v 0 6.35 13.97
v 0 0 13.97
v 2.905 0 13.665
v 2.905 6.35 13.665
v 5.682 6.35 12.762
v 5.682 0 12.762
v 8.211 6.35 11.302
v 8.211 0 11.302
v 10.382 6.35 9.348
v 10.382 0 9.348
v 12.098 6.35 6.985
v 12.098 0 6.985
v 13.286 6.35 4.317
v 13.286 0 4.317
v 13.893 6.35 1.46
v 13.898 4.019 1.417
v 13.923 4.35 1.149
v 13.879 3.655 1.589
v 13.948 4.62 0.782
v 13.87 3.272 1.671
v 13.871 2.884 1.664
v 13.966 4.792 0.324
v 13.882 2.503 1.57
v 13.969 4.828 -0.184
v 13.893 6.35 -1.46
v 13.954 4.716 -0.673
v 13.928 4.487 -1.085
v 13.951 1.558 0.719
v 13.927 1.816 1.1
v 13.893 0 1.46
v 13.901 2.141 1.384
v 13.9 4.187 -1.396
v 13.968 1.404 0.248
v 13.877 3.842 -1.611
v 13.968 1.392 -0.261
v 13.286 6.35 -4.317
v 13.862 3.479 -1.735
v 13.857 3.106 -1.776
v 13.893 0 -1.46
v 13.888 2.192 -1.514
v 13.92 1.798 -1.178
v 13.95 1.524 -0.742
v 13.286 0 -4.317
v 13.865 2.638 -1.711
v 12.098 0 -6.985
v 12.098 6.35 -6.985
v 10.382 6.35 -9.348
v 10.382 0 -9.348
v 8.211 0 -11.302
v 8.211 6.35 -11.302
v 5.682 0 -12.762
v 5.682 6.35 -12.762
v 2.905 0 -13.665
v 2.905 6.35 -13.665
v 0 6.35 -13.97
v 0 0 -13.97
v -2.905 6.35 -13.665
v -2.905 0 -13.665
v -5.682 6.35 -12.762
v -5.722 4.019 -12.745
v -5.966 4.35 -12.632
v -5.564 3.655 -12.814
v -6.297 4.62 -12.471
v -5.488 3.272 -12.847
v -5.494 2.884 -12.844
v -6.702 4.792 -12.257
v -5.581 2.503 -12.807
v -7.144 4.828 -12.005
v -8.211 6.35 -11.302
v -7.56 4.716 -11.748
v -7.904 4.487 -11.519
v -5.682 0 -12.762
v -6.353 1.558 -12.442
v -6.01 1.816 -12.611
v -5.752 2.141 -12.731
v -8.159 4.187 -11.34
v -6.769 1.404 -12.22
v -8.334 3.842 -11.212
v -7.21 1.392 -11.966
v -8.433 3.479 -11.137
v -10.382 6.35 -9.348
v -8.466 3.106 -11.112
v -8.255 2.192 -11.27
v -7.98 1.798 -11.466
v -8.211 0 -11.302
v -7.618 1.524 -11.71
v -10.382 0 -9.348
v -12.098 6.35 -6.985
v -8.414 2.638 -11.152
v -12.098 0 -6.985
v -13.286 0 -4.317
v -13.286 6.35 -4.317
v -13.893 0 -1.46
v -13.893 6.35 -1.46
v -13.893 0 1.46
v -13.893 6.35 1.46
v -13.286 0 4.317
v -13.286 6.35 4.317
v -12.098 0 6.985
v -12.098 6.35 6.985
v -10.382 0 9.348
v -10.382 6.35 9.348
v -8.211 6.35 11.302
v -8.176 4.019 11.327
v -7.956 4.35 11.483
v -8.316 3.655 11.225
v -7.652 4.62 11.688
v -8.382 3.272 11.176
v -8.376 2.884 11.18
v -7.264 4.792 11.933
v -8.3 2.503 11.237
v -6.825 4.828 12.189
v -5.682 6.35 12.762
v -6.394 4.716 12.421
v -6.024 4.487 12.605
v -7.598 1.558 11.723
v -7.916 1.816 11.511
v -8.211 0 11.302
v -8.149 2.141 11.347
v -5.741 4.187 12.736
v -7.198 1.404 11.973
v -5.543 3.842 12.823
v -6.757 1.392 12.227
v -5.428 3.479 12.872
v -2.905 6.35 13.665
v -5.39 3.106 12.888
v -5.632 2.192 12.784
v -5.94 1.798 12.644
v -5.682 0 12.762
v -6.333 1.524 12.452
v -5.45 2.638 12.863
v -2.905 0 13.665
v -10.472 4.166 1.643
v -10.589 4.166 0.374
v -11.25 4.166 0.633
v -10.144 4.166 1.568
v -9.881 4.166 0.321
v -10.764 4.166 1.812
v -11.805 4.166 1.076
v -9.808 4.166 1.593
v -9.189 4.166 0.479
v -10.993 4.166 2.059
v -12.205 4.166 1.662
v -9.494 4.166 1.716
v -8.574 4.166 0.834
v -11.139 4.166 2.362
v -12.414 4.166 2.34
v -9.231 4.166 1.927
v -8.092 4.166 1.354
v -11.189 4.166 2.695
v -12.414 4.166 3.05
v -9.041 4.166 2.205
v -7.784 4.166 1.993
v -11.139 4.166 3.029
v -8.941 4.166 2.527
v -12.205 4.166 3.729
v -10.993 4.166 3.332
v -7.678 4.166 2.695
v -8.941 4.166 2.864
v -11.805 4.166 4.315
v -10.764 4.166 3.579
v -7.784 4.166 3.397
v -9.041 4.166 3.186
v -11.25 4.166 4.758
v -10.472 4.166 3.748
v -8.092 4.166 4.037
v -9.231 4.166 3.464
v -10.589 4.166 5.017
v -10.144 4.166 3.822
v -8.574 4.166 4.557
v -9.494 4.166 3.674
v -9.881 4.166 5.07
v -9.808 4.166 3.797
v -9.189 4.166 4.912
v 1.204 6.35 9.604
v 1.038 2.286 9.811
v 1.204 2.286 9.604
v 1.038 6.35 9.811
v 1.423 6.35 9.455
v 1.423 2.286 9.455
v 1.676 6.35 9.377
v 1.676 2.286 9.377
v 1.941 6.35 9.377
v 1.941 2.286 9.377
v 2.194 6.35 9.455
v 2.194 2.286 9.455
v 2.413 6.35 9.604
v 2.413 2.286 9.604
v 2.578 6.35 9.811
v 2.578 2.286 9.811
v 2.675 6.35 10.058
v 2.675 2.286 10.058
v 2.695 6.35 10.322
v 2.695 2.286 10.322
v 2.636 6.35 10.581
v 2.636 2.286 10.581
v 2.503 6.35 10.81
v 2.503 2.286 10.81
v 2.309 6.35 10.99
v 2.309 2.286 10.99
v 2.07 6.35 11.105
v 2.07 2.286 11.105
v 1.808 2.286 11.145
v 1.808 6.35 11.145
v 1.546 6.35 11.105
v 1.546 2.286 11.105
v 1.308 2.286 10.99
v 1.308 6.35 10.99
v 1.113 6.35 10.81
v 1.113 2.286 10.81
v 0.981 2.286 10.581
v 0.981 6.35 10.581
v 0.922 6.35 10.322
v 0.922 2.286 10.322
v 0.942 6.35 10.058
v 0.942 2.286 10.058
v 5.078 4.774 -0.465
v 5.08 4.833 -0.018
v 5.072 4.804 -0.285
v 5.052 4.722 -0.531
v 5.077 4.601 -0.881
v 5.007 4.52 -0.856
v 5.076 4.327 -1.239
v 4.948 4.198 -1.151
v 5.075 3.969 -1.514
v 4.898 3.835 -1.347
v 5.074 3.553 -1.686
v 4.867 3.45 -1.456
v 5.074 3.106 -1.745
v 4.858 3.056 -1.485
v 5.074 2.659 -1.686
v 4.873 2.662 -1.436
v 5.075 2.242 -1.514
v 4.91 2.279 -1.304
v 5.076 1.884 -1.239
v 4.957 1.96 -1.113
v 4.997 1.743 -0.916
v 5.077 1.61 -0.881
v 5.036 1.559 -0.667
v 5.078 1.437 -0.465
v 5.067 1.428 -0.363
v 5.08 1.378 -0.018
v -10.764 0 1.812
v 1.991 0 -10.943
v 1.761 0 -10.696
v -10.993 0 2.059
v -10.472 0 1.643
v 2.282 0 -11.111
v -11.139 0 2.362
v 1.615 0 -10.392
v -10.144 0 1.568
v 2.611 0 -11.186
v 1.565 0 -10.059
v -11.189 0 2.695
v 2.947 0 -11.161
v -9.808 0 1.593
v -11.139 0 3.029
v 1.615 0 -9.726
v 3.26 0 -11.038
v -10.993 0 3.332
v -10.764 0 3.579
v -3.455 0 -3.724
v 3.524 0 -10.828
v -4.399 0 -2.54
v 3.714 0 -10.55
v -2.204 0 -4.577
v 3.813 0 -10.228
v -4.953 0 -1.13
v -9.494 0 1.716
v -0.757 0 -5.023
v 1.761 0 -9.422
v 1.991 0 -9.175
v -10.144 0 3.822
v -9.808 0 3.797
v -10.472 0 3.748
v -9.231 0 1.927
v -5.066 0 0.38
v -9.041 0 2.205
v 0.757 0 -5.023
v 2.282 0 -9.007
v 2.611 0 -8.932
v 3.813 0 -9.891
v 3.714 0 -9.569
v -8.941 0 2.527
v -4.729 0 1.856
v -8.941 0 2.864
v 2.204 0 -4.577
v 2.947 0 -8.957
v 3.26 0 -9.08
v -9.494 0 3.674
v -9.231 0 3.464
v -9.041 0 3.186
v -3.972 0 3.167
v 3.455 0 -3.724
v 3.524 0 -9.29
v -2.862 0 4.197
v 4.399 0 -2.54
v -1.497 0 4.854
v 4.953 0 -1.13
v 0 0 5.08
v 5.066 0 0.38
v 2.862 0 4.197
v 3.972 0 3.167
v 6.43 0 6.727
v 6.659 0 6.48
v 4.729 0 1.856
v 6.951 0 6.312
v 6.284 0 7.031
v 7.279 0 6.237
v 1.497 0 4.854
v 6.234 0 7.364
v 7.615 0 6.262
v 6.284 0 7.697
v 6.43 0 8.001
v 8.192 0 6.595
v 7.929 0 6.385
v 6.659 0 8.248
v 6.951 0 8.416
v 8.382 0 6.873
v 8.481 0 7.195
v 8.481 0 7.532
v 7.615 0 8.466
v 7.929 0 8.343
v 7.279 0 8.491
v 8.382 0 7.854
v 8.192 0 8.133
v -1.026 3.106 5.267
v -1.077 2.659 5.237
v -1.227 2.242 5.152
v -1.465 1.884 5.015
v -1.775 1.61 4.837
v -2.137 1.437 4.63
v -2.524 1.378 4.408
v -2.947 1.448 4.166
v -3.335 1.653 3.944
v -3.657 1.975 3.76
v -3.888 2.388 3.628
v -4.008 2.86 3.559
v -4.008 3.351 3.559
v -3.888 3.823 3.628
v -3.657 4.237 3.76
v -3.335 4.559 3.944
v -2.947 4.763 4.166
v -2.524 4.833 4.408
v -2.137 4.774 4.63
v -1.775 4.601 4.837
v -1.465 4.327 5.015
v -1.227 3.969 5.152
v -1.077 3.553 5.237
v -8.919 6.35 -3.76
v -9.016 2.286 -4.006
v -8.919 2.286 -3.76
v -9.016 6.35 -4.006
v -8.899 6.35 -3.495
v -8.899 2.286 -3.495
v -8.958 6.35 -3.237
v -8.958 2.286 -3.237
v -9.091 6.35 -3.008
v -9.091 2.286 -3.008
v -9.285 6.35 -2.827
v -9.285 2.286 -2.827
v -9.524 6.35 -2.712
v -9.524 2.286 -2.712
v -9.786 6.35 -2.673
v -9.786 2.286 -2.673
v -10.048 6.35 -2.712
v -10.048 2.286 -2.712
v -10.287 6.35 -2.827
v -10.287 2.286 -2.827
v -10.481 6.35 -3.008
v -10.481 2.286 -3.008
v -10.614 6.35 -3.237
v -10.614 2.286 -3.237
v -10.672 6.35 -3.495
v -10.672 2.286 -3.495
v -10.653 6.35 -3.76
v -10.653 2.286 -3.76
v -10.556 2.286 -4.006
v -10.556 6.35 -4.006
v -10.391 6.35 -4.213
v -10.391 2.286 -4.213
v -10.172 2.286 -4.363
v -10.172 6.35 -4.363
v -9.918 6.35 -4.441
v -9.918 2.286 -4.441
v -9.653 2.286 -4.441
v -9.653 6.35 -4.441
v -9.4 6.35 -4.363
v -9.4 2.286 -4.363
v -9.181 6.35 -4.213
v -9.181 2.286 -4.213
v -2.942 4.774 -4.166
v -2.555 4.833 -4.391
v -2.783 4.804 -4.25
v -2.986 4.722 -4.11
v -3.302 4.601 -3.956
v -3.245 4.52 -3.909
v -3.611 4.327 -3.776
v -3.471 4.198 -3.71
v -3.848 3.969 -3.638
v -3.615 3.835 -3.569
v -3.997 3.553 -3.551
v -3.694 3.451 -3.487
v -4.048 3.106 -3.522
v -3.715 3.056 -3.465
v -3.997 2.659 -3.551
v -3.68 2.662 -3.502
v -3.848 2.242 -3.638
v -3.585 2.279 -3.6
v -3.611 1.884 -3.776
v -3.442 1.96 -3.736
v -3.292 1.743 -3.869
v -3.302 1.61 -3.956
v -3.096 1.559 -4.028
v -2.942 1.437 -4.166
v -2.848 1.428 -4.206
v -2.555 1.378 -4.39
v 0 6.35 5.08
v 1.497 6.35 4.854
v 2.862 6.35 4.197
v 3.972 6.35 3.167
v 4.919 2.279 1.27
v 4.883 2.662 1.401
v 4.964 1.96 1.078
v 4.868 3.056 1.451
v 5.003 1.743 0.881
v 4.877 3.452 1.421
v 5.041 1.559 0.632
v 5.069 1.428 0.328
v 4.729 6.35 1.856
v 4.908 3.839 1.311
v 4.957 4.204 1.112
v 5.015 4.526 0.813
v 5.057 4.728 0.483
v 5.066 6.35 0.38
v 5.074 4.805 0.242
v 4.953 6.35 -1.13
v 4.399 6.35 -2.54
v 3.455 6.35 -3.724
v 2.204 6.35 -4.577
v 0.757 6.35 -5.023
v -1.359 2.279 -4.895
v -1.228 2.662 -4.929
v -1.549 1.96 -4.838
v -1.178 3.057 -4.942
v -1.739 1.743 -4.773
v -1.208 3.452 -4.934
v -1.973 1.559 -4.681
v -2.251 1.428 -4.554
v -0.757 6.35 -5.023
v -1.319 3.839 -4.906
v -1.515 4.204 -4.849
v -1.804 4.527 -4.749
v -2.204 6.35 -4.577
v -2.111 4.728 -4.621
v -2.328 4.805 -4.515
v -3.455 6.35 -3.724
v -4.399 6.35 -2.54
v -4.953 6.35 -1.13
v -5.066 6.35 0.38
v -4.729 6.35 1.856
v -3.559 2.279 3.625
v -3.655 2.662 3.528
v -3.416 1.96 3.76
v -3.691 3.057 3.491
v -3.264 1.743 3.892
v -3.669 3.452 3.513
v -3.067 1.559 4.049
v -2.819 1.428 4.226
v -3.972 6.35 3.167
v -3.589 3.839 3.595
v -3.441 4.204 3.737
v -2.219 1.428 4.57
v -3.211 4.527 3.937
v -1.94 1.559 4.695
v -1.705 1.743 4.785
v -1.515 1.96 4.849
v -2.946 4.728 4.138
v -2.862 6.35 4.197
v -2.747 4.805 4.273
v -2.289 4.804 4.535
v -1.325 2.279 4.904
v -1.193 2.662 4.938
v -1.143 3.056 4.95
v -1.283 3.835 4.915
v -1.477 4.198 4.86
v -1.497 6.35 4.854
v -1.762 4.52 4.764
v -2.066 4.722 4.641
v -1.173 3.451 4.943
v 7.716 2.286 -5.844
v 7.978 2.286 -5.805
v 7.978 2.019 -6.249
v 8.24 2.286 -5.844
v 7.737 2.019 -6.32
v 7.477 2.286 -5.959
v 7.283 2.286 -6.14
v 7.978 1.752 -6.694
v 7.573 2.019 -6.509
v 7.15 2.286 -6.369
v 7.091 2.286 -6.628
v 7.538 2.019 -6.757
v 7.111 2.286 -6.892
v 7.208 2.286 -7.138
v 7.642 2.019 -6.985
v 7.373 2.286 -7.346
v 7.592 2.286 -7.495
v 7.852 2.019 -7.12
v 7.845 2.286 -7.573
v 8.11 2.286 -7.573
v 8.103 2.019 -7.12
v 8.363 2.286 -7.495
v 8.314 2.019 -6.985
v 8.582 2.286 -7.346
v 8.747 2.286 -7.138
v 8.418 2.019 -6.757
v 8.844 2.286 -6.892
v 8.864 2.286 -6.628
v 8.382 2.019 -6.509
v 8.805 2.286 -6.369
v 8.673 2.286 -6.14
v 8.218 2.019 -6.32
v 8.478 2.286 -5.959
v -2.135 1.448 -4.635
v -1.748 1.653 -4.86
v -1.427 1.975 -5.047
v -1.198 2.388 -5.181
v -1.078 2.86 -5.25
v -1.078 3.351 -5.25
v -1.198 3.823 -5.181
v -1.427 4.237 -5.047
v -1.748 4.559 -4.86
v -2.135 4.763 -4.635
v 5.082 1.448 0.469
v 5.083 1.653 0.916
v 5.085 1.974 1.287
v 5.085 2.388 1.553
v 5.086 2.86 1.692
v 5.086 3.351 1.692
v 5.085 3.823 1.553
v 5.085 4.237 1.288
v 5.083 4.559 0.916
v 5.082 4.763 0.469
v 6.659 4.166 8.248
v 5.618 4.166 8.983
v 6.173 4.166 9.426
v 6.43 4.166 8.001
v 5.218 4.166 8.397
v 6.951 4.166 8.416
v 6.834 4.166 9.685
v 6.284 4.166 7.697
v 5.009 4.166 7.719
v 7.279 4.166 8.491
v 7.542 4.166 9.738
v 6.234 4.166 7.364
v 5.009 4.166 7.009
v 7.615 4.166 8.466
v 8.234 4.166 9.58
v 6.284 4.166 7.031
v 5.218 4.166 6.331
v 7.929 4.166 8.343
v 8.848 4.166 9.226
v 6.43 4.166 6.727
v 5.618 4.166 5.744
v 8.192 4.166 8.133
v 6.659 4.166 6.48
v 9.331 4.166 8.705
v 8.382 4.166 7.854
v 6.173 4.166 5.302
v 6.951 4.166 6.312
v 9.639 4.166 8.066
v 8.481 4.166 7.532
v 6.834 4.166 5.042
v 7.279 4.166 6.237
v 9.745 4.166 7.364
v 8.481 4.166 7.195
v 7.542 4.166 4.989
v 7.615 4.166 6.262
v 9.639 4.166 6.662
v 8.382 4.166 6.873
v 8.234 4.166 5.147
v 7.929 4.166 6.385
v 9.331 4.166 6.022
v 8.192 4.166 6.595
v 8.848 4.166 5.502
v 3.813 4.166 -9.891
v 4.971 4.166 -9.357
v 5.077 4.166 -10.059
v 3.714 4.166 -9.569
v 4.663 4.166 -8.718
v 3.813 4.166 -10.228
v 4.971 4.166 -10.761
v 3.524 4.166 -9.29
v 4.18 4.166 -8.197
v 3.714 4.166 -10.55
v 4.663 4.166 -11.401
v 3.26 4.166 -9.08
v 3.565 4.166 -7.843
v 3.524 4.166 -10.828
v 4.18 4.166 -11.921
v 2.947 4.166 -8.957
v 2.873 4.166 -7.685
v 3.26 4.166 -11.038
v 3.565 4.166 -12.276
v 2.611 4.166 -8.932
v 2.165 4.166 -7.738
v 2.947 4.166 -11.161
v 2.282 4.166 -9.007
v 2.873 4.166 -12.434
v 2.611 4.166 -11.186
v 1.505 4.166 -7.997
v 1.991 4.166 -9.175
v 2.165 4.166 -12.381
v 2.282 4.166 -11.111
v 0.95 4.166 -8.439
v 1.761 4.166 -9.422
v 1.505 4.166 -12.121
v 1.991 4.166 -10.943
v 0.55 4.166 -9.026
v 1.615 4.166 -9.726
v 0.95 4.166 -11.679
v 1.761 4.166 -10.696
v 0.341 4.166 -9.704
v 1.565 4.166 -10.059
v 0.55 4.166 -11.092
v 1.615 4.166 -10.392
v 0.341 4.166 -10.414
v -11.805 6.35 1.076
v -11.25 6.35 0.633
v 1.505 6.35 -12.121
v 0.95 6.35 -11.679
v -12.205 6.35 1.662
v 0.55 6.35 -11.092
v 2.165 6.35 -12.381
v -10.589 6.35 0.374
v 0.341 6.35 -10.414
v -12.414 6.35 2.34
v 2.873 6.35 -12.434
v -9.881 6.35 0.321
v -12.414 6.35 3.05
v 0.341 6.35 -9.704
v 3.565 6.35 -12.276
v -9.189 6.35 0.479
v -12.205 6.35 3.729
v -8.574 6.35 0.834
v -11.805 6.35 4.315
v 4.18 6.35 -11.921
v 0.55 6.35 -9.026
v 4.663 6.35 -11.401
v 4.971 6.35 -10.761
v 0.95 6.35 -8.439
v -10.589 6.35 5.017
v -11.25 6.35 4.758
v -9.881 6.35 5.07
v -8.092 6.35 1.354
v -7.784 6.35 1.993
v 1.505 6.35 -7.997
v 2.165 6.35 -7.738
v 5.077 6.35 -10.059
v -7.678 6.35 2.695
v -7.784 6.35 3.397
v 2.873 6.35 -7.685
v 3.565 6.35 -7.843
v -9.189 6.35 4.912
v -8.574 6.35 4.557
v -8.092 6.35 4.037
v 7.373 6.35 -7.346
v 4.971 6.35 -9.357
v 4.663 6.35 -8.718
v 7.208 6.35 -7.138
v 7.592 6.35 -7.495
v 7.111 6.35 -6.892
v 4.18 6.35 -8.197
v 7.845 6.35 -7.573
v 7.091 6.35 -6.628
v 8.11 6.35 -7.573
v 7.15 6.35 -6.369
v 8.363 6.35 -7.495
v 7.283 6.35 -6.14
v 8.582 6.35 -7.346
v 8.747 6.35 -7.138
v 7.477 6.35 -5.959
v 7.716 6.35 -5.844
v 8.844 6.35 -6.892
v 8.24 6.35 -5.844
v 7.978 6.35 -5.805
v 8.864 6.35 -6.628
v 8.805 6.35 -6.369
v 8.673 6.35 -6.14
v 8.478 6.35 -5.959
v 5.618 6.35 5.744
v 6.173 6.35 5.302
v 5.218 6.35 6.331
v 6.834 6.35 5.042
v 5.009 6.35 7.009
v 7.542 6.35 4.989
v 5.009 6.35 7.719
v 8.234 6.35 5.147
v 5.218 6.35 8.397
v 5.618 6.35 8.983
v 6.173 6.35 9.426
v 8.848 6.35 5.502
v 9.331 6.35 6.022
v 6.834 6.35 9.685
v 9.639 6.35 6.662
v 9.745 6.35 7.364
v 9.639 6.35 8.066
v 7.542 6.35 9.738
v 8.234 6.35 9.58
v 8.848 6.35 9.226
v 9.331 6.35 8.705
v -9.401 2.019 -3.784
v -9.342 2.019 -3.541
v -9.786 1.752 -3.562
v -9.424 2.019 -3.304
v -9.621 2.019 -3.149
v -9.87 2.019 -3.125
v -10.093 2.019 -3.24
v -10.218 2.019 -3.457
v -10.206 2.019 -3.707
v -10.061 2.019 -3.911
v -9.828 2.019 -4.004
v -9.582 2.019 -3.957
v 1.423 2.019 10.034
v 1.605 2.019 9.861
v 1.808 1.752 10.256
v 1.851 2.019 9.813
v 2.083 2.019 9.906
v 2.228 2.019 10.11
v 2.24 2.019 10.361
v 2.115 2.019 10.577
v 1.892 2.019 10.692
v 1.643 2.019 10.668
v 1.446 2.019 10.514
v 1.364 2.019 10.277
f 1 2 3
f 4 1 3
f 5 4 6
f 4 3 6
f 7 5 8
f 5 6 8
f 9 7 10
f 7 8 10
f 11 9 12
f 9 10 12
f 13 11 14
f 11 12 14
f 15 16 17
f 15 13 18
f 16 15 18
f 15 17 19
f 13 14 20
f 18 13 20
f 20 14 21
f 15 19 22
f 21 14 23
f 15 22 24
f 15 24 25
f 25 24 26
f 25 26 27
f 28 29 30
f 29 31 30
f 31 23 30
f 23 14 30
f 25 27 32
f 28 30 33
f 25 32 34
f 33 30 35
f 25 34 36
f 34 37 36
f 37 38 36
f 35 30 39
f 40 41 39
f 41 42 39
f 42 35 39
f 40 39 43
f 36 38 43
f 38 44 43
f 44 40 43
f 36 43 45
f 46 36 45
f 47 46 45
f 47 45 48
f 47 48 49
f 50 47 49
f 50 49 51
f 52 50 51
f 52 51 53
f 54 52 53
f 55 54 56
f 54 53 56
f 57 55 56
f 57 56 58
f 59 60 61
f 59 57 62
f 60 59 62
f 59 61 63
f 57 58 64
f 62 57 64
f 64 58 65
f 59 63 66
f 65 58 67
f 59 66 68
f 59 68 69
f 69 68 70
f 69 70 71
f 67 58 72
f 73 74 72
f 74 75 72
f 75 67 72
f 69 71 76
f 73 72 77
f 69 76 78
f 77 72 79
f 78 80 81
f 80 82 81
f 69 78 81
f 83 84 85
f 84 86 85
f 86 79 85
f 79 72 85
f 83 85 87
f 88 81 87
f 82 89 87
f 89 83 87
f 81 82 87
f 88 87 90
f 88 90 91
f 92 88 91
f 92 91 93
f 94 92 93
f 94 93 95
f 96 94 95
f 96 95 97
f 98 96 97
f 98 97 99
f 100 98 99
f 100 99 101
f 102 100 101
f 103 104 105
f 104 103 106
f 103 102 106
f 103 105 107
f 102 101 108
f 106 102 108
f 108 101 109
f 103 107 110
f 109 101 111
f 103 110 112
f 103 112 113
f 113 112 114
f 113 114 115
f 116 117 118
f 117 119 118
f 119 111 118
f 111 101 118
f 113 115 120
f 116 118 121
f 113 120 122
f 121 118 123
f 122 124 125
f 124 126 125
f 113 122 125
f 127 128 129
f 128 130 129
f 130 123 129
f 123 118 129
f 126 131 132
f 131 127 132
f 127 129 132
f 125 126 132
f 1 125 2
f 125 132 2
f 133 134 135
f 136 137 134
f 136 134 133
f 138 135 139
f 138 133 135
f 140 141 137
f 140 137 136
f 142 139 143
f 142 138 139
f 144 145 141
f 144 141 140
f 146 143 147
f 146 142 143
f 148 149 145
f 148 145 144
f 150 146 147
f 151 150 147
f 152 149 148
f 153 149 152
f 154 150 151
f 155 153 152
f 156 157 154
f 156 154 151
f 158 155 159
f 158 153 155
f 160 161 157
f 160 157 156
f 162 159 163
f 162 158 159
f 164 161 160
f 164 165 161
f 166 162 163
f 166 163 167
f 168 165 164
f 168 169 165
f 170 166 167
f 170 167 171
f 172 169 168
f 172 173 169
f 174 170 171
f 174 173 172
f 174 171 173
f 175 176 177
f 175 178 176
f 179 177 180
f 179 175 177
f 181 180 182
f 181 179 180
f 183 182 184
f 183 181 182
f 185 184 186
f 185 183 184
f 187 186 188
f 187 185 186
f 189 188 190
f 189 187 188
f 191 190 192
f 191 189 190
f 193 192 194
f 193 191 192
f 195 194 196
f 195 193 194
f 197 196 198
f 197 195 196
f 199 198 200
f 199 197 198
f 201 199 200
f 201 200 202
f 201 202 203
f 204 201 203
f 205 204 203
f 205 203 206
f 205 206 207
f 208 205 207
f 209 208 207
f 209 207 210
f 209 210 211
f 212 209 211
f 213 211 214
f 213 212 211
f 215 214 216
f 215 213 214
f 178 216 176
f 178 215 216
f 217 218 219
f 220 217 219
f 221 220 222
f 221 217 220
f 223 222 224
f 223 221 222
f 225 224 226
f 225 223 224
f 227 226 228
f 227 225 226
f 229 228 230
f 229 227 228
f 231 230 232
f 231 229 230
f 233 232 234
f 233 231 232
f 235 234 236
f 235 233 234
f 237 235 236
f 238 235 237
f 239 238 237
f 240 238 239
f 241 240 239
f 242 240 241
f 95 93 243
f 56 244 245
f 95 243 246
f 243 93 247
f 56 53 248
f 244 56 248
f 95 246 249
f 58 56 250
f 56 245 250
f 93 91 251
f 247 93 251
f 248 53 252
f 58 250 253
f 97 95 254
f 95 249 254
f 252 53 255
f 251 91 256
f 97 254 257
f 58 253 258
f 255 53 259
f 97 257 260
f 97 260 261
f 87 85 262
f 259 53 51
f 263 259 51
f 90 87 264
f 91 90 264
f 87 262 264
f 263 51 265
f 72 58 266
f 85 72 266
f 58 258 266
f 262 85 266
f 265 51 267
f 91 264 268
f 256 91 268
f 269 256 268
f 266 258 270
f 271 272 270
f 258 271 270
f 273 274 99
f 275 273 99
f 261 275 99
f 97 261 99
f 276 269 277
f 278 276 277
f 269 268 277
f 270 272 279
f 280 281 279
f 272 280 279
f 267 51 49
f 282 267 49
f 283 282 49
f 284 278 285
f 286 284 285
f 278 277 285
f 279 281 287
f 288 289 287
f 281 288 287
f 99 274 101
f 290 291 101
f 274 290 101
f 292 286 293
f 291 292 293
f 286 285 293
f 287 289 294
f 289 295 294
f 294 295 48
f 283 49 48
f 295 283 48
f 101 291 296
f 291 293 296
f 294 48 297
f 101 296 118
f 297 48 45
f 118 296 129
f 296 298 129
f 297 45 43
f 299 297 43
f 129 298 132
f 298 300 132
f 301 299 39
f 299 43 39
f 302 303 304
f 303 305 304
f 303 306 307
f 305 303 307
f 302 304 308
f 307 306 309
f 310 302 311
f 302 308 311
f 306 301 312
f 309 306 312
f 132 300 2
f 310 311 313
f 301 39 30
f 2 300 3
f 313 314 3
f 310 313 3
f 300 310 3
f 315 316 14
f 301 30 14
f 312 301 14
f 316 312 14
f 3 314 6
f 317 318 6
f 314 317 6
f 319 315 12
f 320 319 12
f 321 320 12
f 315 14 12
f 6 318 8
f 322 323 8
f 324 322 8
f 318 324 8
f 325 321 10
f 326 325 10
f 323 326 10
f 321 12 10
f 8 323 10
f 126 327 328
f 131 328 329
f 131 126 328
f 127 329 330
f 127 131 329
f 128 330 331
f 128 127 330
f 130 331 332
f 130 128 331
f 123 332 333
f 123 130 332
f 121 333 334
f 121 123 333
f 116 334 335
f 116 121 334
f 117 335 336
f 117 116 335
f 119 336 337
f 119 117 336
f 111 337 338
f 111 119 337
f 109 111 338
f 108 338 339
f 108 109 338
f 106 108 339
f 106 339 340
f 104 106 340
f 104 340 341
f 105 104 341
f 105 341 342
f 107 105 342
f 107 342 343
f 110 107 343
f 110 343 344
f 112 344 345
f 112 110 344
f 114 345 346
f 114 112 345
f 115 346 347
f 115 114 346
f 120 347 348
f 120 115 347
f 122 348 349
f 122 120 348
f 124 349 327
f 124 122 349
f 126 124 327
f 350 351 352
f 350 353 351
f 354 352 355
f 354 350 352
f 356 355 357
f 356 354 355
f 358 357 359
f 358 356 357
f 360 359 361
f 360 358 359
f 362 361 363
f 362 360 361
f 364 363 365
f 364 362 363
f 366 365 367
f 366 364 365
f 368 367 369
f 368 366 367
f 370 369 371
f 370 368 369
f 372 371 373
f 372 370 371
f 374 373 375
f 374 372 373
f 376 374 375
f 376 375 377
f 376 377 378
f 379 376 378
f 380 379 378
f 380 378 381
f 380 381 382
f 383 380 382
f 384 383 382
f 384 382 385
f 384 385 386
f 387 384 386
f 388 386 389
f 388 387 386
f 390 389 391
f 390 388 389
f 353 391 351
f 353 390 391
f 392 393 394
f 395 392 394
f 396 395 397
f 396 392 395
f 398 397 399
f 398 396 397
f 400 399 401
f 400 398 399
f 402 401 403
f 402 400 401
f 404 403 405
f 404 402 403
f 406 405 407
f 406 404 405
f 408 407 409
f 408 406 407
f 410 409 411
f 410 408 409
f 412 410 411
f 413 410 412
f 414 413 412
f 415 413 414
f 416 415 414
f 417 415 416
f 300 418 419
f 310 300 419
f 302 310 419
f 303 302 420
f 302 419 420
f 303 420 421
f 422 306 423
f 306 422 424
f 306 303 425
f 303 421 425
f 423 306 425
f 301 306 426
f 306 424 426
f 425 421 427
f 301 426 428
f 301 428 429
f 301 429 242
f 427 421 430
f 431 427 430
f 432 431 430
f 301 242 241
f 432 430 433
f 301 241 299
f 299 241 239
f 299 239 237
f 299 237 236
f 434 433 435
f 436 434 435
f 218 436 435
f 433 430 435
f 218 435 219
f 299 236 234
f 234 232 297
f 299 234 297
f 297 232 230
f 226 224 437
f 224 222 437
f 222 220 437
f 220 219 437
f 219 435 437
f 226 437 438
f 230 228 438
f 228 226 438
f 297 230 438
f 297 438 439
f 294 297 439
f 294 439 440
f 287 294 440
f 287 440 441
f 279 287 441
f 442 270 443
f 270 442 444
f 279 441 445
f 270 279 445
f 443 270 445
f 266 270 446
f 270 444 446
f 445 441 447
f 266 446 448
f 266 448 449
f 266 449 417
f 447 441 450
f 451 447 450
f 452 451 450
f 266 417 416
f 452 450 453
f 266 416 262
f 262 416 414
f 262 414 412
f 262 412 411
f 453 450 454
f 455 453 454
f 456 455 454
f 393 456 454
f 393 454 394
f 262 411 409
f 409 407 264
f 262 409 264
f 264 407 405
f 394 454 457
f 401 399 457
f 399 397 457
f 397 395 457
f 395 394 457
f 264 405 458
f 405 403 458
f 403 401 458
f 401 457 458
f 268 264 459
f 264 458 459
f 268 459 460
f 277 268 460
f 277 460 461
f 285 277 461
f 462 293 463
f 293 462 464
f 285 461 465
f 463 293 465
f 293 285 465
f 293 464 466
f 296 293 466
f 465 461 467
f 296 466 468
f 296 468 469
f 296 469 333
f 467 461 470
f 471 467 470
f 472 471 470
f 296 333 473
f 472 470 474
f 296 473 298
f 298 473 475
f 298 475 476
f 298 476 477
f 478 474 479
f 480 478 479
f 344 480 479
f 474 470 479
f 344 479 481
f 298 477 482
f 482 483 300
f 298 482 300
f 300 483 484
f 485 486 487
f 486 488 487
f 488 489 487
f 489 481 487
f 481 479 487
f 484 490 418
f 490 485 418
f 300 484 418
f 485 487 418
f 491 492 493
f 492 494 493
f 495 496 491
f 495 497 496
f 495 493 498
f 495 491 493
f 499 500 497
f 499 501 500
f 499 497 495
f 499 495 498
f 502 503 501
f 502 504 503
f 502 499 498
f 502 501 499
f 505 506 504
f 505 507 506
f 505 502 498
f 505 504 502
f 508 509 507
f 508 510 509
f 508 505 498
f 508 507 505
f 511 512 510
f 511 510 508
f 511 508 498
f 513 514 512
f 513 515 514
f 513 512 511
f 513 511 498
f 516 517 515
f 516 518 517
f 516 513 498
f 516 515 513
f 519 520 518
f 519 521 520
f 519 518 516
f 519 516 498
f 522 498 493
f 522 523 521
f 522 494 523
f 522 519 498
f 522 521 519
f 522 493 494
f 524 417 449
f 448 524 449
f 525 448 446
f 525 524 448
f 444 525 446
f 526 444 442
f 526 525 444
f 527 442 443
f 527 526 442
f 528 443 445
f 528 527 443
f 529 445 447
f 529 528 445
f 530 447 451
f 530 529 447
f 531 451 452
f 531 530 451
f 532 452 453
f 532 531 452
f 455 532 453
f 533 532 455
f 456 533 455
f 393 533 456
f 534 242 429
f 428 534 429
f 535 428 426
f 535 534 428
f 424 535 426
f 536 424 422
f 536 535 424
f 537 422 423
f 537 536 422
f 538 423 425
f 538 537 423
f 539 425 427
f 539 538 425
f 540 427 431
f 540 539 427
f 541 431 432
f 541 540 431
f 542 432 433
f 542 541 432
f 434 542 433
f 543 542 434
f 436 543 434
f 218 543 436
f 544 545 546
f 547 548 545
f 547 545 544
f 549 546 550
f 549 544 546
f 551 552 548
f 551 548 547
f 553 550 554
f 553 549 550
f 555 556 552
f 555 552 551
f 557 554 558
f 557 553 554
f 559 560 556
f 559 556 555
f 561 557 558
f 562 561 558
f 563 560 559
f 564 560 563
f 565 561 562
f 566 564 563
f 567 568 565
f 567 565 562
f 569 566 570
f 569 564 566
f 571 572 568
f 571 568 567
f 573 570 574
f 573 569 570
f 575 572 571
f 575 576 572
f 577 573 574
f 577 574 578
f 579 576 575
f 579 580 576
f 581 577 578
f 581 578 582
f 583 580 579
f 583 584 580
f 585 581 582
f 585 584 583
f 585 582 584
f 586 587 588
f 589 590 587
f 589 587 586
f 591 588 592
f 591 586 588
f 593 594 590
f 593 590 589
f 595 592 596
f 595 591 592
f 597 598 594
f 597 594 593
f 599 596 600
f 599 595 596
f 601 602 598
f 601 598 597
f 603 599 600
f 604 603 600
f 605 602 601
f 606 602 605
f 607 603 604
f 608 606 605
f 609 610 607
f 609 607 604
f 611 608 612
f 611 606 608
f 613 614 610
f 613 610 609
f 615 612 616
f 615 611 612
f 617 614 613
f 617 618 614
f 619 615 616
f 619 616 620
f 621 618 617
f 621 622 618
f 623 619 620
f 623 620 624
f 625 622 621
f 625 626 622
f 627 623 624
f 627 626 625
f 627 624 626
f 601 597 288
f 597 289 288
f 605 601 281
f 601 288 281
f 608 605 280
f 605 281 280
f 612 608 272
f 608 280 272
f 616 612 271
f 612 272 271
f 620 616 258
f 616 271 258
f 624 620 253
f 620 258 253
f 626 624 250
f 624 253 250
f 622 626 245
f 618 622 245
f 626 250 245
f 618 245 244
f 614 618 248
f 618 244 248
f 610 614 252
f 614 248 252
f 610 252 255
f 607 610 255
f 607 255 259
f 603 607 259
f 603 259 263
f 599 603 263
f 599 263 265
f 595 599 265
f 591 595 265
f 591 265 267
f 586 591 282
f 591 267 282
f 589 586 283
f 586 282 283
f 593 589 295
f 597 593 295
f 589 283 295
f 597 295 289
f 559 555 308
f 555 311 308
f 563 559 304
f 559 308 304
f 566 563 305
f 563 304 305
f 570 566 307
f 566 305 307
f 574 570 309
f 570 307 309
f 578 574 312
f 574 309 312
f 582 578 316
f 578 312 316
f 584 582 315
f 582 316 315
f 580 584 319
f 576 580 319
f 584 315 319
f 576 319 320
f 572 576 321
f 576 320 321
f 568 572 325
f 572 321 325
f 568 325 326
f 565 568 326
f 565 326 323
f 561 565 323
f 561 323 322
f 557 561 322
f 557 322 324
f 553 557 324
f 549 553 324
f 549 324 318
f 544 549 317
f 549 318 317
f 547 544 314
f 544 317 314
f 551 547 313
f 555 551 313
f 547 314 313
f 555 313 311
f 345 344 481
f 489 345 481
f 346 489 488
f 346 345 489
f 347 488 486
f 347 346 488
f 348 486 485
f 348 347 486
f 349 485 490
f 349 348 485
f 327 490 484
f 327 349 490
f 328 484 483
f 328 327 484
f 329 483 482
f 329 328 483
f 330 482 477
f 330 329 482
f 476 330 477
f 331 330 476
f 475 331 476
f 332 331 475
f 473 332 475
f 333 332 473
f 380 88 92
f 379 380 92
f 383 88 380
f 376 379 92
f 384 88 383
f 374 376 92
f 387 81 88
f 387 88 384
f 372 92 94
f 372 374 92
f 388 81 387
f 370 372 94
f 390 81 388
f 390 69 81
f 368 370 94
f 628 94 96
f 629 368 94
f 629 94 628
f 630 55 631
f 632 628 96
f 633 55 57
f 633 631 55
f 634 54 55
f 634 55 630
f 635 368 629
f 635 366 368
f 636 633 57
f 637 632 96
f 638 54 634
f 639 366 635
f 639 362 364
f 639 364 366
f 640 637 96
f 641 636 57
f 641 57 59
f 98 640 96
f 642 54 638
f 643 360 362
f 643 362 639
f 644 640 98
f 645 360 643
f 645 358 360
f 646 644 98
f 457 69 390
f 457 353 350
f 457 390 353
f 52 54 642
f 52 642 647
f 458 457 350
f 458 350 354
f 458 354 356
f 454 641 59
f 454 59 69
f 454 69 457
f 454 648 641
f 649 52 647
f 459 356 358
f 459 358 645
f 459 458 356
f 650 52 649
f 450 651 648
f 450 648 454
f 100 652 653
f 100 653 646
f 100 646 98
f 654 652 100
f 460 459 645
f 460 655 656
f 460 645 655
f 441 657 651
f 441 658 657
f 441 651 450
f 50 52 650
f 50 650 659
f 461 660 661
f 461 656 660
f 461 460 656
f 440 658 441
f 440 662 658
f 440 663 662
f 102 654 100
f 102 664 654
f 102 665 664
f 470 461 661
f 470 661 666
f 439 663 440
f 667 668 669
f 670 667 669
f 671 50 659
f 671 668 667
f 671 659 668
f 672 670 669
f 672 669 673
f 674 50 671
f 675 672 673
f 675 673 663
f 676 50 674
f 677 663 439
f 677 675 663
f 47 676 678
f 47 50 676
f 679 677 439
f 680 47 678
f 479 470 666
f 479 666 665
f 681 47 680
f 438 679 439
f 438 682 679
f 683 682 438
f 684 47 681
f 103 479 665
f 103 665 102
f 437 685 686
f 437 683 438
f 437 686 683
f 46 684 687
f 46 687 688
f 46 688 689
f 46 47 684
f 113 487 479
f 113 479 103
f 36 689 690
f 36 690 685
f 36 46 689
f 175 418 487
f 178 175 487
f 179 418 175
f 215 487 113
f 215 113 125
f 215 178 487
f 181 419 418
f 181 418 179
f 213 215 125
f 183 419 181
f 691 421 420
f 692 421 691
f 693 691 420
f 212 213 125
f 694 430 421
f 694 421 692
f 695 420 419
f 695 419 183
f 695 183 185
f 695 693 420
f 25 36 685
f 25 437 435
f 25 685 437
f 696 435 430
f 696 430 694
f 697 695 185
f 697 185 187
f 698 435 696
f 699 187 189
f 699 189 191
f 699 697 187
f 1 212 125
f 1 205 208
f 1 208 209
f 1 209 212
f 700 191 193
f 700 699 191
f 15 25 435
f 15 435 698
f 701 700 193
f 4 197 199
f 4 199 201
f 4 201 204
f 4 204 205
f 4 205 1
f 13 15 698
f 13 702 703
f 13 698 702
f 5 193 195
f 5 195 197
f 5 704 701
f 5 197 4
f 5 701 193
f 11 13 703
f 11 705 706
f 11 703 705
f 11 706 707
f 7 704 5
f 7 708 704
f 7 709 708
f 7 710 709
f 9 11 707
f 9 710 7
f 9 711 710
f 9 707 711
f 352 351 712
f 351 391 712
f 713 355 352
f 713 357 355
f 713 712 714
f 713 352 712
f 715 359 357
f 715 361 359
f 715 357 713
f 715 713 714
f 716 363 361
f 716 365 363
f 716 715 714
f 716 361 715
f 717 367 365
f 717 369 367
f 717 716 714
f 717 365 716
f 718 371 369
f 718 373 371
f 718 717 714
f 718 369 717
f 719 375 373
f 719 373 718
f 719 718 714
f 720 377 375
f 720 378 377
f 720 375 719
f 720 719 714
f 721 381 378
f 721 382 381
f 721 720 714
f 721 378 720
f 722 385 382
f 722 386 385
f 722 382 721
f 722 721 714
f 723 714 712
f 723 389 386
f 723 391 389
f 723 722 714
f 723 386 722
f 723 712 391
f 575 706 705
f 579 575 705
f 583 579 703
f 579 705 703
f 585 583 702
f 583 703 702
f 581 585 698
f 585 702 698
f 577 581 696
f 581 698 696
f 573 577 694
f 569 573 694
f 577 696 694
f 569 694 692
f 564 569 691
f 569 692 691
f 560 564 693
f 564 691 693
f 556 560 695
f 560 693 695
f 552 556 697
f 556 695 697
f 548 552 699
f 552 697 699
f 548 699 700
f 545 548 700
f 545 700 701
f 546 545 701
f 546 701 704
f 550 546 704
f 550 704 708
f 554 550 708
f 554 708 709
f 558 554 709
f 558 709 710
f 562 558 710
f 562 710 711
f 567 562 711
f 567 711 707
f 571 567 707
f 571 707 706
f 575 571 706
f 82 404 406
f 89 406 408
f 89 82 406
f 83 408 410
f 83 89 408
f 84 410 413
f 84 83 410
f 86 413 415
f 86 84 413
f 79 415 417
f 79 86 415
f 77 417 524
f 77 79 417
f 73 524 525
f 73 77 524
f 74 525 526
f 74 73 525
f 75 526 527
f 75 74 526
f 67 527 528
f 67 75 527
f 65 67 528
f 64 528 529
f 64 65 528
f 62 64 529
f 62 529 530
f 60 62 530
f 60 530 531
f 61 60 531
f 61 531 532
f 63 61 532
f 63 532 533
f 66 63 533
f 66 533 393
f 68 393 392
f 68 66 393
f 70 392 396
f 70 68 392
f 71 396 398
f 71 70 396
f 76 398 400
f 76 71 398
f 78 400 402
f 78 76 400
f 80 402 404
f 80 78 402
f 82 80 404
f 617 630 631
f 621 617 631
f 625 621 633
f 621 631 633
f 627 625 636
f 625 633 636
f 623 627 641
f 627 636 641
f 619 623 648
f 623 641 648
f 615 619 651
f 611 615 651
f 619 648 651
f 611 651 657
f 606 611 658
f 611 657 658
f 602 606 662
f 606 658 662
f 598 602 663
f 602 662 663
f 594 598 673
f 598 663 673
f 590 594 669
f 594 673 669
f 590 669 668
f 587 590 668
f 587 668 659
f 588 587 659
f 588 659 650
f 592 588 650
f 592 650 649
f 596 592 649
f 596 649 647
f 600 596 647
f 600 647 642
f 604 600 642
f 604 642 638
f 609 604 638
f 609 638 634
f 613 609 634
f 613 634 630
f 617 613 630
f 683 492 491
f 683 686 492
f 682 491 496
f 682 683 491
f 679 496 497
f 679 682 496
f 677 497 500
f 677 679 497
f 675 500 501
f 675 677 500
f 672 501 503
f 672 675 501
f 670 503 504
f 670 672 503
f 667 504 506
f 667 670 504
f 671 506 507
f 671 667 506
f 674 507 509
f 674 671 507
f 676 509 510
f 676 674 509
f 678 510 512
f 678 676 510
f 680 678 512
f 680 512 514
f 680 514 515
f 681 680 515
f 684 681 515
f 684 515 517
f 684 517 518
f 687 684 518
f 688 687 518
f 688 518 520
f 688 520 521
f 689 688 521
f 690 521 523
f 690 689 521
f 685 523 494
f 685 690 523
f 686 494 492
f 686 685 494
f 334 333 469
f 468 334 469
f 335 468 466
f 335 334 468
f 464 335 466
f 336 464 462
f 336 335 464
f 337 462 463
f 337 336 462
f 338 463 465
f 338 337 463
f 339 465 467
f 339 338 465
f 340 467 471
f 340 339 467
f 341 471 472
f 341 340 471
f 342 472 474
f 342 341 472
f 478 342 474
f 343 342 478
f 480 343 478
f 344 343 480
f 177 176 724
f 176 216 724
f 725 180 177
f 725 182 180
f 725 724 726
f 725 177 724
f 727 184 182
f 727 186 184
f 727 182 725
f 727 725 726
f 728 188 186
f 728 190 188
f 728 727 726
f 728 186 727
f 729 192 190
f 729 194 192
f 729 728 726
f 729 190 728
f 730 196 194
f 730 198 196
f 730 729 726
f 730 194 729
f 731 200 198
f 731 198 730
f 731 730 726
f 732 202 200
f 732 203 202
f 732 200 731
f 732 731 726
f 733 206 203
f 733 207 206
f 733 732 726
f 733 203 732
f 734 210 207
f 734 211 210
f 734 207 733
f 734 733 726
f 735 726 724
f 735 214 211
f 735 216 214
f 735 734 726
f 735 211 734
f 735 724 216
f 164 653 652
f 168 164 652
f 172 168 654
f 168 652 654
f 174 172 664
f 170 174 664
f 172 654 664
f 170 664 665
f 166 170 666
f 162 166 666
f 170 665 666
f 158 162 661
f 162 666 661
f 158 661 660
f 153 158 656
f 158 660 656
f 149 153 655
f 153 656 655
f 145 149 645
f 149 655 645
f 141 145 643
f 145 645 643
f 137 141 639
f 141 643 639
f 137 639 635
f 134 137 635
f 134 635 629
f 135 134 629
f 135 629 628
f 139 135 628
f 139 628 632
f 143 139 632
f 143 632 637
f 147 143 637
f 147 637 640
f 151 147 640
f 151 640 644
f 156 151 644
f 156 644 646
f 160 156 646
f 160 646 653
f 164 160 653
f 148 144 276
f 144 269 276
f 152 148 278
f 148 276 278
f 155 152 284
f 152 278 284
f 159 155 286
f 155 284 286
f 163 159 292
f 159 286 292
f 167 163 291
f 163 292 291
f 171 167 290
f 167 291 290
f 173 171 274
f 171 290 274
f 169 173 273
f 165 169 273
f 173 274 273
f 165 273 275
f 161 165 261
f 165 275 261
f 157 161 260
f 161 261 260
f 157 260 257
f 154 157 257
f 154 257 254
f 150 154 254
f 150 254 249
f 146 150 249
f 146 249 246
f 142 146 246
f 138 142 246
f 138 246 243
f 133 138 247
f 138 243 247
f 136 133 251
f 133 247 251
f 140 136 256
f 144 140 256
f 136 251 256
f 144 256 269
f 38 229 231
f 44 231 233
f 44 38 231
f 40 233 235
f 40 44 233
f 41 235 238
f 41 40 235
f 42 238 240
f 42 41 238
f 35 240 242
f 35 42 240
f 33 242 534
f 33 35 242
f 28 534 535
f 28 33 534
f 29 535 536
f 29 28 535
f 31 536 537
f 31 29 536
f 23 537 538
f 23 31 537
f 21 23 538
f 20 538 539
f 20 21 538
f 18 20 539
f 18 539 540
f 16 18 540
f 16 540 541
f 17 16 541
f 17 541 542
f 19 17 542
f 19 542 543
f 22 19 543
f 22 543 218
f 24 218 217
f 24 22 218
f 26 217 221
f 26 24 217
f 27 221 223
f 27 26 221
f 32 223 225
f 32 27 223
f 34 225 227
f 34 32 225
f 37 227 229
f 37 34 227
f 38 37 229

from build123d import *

# Parameters (mm, degrees)
SKETCH1_R                                      = 13.97
BOSS_EXTRUDE1_DEPTH                            = 6.35
CBORE_FOR_2_SOCKET_HEAD_CAP_SCREW1_D           = 2.2606
CBORE_FOR_2_SOCKET_HEAD_CAP_SCREW1_CBORE_D     = 4.7625
CBORE_FOR_2_SOCKET_HEAD_CAP_SCREW1_CBORE_DEPTH = 2.1844
CIRPATTERN1_COUNT                              = 3
CIRPATTERN2_COUNT                              = 3
CIRPATTERN3_COUNT                              = 3
CUT_EXTRUDE2_REACH                             = 22.752
SKETCH16_R                                     = 5.08


with BuildPart() as part:
    # Sketch1 → Boss-Extrude1 (new body)
    with BuildSketch(Plane(origin=(0, 0, 0), x_dir=(1, 0, 0), z_dir=(0, 1, 0))):
        with Locations(Location((0, 0, 0), (0, 0, 270))):
            Circle(SKETCH1_R)
    extrude(amount=BOSS_EXTRUDE1_DEPTH)

    # CBORE for #2 Socket Head Cap Screw1 (through all)
    with Locations(Plane(origin=(0, 6.35, 0), x_dir=(1, 0, 0), z_dir=(0, 1, 0))):
        with Locations((7.363810019, -7.363810019)):
            cbore_for_2_socket_head_cap_screw1 = CounterBoreHole(CBORE_FOR_2_SOCKET_HEAD_CAP_SCREW1_D / 2, CBORE_FOR_2_SOCKET_HEAD_CAP_SCREW1_CBORE_D / 2, CBORE_FOR_2_SOCKET_HEAD_CAP_SCREW1_CBORE_DEPTH)

    # CirPattern1: CBORE for #2 Socket Head Cap Screw1 ×3 about axis
    cirpattern1_axis = Axis((0, 0, 0), (0, 1, 0))
    for i in range(1, CIRPATTERN1_COUNT):
        add(cbore_for_2_socket_head_cap_screw1.rotate(cirpattern1_axis, i * 360 / CIRPATTERN1_COUNT), mode=Mode.SUBTRACT)

    # Sketch10 → Tap Drill for #2-56 Tap2 (revolve, cut)
    with BuildSketch(Plane(origin=(7.977586831, 6.35, -6.693990167), x_dir=(0, 0, 1), z_dir=(1, 0, 0))):
        Polygon((0, 0), (0, 4.59816509), (0.889, 4.064), (0.889, 0), align=None)
    tap_drill_for_2_56_tap2 = revolve(axis=Axis((7.977586831, 12.7, -6.693990167), (0, -1, 0)), mode=Mode.SUBTRACT)

    # CirPattern2: Tap Drill for #2-56 Tap2 ×3 about axis
    cirpattern2_axis = Axis((0, 0, 0), (0, 1, 0))
    for i in range(1, CIRPATTERN2_COUNT):
        add(tap_drill_for_2_56_tap2.rotate(cirpattern2_axis, i * 360 / CIRPATTERN2_COUNT), mode=Mode.SUBTRACT)

    # Sketch15 → Tap Drill for #8-32 Tap2 (revolve, cut)
    with BuildSketch(Plane(origin=(-6.942501454, 3.105629072, 12.122812114), x_dir=(0.8677746681735182, 0, 0.4969578707258195), z_dir=(0, 1, 0))):
        Polygon((0, 0), (0, 10.339292883), (1.7272, 8.89), (1.7272, 0), align=None)
    tap_drill_for_8_32_tap2 = revolve(axis=Axis((-10.098183933, 3.105629072, 17.633181257), (0.4969578707258195, 0, -0.8677746681735182)), mode=Mode.SUBTRACT)

    # CirPattern3: Tap Drill for #8-32 Tap2 ×3 about axis
    cirpattern3_axis = Axis((0, 6.35, 0), (0, -1, 0))
    for i in range(1, CIRPATTERN3_COUNT):
        add(tap_drill_for_8_32_tap2.rotate(cirpattern3_axis, i * 360 / CIRPATTERN3_COUNT), mode=Mode.SUBTRACT)

    # Sketch16 → Cut-Extrude2 (cut, up to next)
    with BuildSketch(Plane(origin=(0, 6.35, 0), x_dir=(1, 0, 0), z_dir=(0, 1, 0)), mode=Mode.PRIVATE) as cut_extrude2_sk1:
        with Locations(Location((0, 0, 0), (0, 0, 270))):
            Circle(SKETCH16_R)
    cut_extrude2_tool1 = extrude(cut_extrude2_sk1.sketch, amount=-CUT_EXTRUDE2_REACH, mode=Mode.PRIVATE) & part.part
    add(cut_extrude2_tool1.solids().sort_by_distance((0, 6.35, 0))[0], mode=Mode.SUBTRACT)


solid = part.part
